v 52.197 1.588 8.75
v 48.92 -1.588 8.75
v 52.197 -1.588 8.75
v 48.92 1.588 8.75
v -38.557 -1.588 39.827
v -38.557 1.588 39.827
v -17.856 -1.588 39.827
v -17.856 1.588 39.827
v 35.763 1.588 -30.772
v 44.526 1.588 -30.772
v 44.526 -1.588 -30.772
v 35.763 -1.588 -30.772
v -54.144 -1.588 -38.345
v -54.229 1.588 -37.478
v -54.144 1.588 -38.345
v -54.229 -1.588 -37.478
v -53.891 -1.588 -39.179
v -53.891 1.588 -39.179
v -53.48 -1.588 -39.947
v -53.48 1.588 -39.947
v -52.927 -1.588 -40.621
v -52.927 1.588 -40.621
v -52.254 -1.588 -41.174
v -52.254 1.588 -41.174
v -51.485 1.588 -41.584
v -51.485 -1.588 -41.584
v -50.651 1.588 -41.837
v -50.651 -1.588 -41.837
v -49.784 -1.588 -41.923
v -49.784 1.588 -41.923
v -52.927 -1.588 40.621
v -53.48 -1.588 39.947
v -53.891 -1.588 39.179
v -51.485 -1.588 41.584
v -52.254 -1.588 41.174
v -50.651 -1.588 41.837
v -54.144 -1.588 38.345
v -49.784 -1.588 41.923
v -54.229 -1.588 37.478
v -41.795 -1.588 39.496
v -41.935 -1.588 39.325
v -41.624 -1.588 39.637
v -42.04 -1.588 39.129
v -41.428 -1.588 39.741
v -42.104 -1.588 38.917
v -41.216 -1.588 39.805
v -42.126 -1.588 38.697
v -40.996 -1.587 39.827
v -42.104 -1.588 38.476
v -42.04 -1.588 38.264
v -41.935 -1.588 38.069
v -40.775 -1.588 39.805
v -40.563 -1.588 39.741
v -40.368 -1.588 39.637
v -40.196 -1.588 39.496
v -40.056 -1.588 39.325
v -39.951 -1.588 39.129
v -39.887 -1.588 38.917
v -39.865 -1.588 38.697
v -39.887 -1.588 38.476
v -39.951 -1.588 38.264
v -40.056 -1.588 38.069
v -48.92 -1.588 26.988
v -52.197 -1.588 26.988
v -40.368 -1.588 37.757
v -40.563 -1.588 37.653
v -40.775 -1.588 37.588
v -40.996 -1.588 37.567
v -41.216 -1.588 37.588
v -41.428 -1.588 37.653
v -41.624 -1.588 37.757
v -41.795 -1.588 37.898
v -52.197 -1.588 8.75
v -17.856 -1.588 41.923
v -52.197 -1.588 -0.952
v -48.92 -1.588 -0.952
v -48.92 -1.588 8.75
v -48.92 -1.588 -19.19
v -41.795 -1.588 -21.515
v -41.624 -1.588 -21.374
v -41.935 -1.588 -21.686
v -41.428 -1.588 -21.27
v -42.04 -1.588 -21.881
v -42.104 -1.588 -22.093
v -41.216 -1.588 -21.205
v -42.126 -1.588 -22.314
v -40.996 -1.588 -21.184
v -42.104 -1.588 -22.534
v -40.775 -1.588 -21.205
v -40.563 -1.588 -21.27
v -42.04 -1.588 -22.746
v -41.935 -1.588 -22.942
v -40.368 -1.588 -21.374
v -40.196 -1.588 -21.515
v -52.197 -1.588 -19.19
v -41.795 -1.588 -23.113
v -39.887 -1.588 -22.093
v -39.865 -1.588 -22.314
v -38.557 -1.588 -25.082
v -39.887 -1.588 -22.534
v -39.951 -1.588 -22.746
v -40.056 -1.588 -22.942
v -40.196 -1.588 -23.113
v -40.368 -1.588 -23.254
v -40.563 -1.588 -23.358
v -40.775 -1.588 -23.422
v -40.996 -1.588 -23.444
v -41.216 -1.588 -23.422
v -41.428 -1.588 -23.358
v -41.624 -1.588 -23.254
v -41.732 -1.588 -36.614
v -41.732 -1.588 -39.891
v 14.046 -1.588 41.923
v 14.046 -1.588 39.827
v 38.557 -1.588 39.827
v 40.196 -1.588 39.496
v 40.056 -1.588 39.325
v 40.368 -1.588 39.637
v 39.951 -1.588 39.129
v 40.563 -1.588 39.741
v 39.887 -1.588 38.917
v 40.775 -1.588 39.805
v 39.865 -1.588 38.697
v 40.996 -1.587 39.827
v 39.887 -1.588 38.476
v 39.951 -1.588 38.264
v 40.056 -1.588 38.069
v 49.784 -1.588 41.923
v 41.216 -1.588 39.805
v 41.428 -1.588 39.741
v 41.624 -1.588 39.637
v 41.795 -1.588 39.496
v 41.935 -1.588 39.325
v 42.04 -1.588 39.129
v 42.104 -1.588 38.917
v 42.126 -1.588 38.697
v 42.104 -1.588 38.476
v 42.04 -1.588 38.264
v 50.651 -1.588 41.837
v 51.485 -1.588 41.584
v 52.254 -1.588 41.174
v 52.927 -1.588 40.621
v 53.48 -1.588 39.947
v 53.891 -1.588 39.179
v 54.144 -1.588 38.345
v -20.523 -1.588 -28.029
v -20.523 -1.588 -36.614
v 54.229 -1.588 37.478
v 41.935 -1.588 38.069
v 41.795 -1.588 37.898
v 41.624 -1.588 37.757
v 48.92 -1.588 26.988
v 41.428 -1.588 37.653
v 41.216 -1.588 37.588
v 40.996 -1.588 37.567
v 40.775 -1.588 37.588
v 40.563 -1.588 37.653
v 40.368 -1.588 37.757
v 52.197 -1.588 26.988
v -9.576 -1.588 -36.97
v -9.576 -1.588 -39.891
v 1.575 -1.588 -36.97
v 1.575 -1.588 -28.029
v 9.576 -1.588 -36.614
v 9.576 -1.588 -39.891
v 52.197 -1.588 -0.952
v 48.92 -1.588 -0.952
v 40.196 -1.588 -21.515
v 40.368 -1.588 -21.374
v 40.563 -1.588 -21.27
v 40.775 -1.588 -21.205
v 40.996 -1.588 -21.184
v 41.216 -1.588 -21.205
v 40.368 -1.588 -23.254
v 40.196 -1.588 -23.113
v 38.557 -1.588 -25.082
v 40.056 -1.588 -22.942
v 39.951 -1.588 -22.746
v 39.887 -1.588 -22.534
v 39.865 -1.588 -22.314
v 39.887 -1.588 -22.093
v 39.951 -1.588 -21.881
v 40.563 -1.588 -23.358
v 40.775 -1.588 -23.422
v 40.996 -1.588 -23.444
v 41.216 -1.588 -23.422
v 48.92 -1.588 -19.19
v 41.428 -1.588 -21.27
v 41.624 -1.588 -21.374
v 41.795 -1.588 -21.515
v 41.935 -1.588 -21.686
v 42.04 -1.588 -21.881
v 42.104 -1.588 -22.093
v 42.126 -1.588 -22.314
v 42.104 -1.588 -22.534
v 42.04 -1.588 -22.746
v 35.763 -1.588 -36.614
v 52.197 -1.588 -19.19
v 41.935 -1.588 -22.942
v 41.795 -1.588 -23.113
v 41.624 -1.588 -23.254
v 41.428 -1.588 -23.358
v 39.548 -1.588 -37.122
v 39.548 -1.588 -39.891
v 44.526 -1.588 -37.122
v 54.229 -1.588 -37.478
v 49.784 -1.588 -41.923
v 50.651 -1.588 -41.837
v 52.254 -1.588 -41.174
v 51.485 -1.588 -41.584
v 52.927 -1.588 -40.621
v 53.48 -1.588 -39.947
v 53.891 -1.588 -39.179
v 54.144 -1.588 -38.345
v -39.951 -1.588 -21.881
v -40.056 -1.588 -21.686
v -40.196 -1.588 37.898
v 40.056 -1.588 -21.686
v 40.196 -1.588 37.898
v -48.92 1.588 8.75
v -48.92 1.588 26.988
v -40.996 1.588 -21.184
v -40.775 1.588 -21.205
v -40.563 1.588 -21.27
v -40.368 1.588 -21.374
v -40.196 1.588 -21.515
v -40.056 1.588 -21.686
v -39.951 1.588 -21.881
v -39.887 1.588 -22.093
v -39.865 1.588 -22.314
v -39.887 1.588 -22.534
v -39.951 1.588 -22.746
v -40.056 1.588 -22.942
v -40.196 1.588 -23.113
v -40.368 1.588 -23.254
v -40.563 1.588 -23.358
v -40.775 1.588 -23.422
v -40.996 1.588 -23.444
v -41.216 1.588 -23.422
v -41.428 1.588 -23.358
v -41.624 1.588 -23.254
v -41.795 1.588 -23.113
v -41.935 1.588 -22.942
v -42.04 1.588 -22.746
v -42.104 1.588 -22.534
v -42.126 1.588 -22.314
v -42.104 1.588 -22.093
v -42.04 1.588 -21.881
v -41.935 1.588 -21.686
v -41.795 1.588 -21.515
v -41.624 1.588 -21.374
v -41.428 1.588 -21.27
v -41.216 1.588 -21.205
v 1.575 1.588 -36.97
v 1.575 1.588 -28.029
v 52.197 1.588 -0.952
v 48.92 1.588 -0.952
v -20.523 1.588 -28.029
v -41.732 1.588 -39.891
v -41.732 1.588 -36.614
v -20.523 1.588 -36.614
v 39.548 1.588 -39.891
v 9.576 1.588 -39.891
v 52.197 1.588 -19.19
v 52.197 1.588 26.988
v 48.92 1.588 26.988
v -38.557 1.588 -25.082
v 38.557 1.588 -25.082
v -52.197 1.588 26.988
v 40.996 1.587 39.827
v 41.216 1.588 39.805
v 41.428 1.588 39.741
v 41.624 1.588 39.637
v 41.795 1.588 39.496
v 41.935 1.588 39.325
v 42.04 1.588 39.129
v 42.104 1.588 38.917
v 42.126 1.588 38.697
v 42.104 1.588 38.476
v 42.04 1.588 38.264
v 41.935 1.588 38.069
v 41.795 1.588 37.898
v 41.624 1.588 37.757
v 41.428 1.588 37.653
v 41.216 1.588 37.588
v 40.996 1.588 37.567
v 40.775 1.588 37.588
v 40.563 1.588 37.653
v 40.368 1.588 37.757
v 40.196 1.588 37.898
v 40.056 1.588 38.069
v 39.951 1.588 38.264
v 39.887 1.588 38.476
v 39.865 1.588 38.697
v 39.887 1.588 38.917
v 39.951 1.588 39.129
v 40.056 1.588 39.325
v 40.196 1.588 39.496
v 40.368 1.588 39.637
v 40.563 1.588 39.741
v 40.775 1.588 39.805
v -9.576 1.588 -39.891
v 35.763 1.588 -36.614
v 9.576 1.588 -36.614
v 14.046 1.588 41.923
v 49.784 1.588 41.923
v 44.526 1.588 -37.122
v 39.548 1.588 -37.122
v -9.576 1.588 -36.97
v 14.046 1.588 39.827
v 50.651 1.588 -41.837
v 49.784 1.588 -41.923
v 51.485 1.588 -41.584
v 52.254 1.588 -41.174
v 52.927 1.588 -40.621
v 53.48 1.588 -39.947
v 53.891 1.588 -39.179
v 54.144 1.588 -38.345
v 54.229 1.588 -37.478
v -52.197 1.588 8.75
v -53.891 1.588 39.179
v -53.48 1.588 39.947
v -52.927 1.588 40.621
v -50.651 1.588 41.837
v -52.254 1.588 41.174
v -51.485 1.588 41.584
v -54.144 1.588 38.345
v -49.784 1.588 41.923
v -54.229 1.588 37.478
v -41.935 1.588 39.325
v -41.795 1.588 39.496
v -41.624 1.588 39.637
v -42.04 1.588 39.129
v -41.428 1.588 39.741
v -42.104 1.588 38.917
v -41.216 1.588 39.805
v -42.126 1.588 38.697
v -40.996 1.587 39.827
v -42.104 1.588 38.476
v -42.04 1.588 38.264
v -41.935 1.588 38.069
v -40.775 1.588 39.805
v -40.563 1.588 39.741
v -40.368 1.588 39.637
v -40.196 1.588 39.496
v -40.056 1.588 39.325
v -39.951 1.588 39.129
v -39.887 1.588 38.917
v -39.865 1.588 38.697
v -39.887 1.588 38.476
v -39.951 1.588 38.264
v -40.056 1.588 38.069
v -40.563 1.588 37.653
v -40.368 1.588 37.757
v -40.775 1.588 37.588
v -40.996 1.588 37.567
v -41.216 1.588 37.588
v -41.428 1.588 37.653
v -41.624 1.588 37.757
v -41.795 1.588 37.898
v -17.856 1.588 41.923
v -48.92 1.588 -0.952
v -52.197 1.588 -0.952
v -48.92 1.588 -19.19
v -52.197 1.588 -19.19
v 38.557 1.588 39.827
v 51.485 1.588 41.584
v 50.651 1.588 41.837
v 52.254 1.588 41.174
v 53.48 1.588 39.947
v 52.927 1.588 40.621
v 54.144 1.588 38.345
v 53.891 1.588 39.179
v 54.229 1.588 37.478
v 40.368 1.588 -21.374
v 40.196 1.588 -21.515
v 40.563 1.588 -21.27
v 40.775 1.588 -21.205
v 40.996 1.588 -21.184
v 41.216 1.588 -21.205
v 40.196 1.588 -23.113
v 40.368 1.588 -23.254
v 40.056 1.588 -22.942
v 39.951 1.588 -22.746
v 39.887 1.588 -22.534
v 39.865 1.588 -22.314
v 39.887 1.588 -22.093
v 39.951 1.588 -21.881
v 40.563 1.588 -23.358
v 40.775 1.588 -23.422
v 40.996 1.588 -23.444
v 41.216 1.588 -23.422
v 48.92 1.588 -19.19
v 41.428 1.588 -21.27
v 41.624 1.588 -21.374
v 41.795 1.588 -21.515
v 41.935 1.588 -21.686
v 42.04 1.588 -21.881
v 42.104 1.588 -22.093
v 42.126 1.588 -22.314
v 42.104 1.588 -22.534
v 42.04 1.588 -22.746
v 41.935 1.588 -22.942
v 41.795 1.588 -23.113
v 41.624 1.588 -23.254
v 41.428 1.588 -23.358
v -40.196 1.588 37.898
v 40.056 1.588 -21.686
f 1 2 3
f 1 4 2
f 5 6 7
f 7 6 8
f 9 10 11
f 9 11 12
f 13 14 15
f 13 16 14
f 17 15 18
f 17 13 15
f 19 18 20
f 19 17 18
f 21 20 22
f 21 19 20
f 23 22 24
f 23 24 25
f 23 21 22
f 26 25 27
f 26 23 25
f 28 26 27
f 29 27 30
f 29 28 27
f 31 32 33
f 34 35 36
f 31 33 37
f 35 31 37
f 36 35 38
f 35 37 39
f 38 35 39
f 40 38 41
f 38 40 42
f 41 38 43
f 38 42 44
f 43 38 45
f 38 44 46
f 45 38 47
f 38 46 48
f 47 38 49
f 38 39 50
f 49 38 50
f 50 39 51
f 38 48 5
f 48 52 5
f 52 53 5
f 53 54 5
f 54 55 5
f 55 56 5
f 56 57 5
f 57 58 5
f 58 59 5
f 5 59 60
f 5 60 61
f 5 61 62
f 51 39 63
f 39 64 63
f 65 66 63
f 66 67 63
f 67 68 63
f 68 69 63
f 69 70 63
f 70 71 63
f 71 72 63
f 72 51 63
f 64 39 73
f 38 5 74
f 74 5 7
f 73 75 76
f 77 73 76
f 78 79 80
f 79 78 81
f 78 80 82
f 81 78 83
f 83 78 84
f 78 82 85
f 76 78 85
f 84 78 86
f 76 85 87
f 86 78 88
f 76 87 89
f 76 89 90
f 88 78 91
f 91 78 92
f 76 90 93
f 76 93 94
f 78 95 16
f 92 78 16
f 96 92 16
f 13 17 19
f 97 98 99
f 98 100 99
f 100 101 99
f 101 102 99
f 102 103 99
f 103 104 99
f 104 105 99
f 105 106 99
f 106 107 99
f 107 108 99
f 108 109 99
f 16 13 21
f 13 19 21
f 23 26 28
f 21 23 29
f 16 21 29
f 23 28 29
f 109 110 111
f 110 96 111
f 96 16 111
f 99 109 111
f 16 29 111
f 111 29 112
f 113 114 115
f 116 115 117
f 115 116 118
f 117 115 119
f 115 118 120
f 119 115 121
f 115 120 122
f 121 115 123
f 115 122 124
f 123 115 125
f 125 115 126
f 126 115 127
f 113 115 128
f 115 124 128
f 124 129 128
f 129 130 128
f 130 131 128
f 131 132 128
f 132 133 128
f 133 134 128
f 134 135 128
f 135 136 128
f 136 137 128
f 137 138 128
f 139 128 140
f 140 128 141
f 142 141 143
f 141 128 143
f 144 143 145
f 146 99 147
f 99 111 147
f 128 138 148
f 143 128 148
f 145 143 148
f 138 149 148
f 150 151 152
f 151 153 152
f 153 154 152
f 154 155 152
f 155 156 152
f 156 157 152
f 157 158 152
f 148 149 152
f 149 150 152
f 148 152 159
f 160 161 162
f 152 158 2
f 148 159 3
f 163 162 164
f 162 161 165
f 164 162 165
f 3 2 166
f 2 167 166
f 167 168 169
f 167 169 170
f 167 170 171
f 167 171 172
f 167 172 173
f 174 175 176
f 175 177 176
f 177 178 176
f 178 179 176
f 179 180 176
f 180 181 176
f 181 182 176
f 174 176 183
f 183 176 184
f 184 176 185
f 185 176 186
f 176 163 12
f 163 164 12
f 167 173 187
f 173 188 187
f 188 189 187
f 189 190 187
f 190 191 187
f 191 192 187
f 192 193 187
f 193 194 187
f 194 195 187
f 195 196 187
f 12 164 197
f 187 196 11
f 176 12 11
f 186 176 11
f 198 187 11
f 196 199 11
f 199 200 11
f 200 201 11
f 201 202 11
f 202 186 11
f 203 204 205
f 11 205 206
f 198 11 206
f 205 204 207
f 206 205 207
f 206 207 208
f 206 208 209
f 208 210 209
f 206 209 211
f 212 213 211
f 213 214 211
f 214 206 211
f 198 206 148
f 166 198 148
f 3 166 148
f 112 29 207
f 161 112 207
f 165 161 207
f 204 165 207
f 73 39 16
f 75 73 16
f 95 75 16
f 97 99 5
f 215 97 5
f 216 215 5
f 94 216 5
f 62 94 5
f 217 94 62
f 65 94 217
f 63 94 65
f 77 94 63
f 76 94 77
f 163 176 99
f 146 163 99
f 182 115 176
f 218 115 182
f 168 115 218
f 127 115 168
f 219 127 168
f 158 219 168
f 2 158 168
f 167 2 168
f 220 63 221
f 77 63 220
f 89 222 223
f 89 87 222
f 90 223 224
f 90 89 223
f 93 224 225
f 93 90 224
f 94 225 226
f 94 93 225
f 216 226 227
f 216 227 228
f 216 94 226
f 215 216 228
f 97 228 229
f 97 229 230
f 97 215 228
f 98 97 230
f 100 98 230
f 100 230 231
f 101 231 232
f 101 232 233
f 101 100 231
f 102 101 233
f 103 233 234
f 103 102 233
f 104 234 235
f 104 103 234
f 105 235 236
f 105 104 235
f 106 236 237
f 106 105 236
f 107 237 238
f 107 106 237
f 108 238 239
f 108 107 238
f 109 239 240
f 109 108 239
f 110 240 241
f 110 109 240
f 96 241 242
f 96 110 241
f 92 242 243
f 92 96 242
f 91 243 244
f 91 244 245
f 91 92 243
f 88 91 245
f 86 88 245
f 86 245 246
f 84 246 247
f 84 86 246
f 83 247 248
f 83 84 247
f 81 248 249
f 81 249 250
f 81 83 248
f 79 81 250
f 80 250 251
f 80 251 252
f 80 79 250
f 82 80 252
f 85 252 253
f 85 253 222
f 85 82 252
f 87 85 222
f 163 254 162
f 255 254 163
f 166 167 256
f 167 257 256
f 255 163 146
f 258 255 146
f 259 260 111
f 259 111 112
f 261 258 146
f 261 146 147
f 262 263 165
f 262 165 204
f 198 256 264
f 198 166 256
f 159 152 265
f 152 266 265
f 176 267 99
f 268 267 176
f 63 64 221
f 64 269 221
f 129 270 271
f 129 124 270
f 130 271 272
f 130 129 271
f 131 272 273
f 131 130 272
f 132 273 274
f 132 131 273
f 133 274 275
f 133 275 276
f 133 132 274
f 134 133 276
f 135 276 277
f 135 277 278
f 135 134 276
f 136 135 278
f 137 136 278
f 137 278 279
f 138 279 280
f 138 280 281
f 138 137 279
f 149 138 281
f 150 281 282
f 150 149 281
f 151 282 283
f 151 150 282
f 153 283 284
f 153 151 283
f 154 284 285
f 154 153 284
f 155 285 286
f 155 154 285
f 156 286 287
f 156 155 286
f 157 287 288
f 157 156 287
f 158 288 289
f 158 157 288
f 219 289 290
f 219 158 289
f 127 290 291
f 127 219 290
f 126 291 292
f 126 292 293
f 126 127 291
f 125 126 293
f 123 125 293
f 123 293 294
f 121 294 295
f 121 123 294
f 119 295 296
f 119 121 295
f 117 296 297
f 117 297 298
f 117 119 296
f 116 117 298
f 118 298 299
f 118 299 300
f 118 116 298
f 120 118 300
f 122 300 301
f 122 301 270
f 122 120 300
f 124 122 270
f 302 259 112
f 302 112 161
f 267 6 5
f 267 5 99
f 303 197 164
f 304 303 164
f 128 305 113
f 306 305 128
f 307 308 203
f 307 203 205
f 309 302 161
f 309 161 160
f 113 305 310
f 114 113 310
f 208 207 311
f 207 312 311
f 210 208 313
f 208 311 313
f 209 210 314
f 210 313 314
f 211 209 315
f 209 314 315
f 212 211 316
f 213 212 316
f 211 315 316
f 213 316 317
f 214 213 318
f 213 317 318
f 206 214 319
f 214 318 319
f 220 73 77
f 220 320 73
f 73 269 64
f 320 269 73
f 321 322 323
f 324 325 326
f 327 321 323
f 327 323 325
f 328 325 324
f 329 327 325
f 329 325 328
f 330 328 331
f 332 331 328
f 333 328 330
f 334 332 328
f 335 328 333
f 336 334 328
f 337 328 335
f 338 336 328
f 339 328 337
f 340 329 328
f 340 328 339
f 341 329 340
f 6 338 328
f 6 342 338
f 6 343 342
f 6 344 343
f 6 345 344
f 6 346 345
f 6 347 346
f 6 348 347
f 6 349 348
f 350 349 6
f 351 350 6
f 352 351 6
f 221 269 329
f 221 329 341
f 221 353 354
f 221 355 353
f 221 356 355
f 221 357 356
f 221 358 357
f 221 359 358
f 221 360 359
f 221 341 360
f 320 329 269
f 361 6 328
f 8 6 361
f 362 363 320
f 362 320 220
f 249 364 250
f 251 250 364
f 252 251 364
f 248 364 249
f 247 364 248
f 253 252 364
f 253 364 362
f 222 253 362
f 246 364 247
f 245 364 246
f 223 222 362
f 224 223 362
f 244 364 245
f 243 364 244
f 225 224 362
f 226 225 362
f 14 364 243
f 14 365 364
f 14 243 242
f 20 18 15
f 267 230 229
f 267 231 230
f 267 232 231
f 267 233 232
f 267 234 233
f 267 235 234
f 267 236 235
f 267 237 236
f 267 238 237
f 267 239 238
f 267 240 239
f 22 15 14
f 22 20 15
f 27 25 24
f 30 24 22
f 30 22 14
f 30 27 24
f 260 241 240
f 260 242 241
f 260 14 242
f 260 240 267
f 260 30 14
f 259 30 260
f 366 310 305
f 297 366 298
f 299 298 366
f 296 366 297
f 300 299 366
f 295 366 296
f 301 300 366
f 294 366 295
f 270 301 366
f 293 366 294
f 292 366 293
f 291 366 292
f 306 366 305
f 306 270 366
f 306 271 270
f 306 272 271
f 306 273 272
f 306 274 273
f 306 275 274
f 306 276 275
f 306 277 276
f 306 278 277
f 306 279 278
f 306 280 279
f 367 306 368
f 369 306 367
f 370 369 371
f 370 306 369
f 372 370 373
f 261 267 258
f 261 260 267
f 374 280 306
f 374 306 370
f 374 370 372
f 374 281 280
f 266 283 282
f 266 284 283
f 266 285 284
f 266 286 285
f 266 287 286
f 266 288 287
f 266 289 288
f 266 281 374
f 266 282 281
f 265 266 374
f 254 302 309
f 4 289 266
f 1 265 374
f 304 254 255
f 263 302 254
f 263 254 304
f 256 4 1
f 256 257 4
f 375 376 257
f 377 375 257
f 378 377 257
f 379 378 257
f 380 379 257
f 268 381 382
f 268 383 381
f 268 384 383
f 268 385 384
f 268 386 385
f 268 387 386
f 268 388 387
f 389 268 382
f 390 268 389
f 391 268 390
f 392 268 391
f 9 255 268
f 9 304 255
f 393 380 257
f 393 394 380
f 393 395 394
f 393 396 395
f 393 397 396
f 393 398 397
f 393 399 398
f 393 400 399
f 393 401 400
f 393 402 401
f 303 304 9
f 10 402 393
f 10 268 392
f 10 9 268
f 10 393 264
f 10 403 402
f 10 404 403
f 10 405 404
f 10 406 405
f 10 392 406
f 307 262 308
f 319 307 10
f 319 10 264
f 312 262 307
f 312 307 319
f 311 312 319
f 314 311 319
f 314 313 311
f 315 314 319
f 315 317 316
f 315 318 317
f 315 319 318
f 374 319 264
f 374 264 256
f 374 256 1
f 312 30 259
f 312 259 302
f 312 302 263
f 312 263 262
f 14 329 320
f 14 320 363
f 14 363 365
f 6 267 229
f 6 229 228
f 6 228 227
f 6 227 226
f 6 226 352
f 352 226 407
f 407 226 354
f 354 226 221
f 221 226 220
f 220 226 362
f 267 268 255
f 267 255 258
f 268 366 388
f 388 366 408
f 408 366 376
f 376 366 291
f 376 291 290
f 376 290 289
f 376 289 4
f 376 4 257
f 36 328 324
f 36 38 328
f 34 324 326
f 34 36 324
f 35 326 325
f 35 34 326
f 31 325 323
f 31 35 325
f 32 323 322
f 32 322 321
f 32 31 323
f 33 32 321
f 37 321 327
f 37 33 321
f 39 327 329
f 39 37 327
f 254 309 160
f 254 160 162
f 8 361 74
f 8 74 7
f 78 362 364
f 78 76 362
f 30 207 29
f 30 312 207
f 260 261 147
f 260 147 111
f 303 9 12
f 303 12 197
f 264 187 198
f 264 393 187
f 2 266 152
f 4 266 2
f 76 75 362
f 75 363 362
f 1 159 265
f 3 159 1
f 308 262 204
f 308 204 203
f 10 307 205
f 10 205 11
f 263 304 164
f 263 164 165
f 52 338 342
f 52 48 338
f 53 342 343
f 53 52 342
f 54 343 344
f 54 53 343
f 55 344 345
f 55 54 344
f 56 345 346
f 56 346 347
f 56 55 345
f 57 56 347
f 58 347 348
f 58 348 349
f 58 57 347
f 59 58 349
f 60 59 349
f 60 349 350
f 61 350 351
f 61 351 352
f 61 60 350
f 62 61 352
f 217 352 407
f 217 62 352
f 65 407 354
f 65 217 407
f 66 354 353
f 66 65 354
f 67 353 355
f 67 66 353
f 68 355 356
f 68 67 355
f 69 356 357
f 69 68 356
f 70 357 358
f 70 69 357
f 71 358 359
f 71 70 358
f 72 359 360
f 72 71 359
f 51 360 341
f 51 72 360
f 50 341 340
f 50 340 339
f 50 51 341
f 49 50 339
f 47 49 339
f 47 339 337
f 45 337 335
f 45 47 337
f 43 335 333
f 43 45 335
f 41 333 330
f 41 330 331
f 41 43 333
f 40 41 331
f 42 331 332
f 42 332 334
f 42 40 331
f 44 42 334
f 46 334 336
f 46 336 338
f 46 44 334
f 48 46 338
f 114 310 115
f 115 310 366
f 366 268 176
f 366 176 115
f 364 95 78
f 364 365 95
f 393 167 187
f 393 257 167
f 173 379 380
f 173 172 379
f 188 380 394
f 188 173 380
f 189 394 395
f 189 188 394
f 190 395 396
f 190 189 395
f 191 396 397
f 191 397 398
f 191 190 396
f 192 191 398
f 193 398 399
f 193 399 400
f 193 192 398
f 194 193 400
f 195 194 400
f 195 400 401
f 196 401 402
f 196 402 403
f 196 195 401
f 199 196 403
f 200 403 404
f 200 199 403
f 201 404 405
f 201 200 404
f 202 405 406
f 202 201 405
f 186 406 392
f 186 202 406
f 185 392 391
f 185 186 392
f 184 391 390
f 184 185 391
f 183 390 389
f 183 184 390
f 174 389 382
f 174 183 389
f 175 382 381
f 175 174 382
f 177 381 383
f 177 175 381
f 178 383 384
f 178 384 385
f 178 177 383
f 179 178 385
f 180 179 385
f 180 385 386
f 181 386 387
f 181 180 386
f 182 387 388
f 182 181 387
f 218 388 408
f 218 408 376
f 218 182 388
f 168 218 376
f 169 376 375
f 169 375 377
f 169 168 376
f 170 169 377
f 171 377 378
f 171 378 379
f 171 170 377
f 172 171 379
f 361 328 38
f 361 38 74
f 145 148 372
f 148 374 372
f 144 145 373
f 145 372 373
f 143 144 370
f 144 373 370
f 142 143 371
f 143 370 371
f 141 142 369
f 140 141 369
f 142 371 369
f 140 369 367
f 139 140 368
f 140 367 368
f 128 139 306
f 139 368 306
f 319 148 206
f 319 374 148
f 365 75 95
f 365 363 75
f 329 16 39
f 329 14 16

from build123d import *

# Parameters (mm, degrees)
SKETCH1_R           = 1.1303
SKETCH1_W           = 3.2766
SKETCH1_H           = 18.2372
BOSS_EXTRUDE1_DEPTH = 1.5875
FILLET1_R           = 4.445
SKETCH2_W           = 81.9912
SKETCH2_H           = 2.0955
BOSS_EXTRUDE2_DEPTH = 3.175
SKETCH3_W           = 31.9024
SKETCH3_H           = 2.0955
CUT_EXTRUDE1_DEPTH  = 3.175


with BuildPart() as part:
    # Sketch1 → Boss-Extrude1 (new, symmetric)
    with BuildSketch(Plane(origin=(0, 0, 0), x_dir=(1, 0, 0), z_dir=(0, 1, 0))):
        Polygon((-38.5572, -41.9227), (-38.5572, 25.0825), (38.5572, 25.0825), (38.5572, -41.9227), (54.229, -41.9227), (54.229, 41.9227), (-54.229, 41.9227), (-54.229, -41.9227), align=None)
        with Locations(Location((-40.9956, -38.6969, 0), (0, 0, 270))):
            Circle(SKETCH1_R, mode=Mode.SUBTRACT)
        with Locations(Location((-40.9956, 22.3139, 0), (0, 0, 270))):
            Circle(SKETCH1_R, mode=Mode.SUBTRACT)
        with Locations(Location((40.9956, 22.3139, 0), (0, 0, 270))):
            Circle(SKETCH1_R, mode=Mode.SUBTRACT)
        with Locations(Location((40.9956, -38.6969, 0), (0, 0, 270))):
            Circle(SKETCH1_R, mode=Mode.SUBTRACT)
        with Locations((-50.5587, 10.0711)):
            Rectangle(SKETCH1_W, SKETCH1_H, mode=Mode.SUBTRACT)
        with Locations((-50.5587, -17.8689)):
            Rectangle(SKETCH1_W, SKETCH1_H, mode=Mode.SUBTRACT)
        with Locations((50.5587, -17.8689)):
            Rectangle(SKETCH1_W, SKETCH1_H, mode=Mode.SUBTRACT)
        with Locations((50.5587, 10.0711)):
            Rectangle(SKETCH1_W, SKETCH1_H, mode=Mode.SUBTRACT)
        Polygon((-20.5232, 36.6141), (-41.7322, 36.6141), (-41.7322, 39.8907), (-9.5758, 39.8907), (-9.5758, 37.2237), (-9.5758, 36.9697), (1.5748, 36.9697), (1.5748, 28.0289), (-20.5232, 28.0289), align=None, mode=Mode.SUBTRACT)
        Polygon((9.5758, 38.590972839), (9.5758, 39.8907), (39.5478, 39.8907), (39.5478, 37.1221), (44.5262, 37.1221), (44.5262, 30.7721), (35.7632, 30.7721), (35.7632, 36.6141), (9.5758, 36.6141), align=None, mode=Mode.SUBTRACT)
    extrude(amount=BOSS_EXTRUDE1_DEPTH, both=True)

    # Fillet1
    fillet1_edges = [part.edges().sort_by_distance(p)[0] for p in [
        (-54.229, 0, -41.9227),
        (54.229, 0, -41.9227),
        (54.229, 0, 41.9227),
        (-54.229, 0, 41.9227),
    ]]
    fillet(fillet1_edges, radius=FILLET1_R)

    # Sketch2 → Boss-Extrude2 (add)
    with BuildSketch(Plane(origin=(0, 1.5875, 0), x_dir=(1, 0, 0), z_dir=(0, 1, 0))):
        with Locations((0, -40.87495)):
            Rectangle(SKETCH2_W, SKETCH2_H)
    extrude(amount=-BOSS_EXTRUDE2_DEPTH)

    # Sketch3 → Cut-Extrude1 (cut)
    with BuildSketch(Plane(origin=(0, 1.5875, 0), x_dir=(1, 0, 0), z_dir=(0, 1, 0))):
        with Locations((-1.905, -40.87495)):
            Rectangle(SKETCH3_W, SKETCH3_H)
    extrude(amount=-CUT_EXTRUDE1_DEPTH, mode=Mode.SUBTRACT)


solid = part.part
